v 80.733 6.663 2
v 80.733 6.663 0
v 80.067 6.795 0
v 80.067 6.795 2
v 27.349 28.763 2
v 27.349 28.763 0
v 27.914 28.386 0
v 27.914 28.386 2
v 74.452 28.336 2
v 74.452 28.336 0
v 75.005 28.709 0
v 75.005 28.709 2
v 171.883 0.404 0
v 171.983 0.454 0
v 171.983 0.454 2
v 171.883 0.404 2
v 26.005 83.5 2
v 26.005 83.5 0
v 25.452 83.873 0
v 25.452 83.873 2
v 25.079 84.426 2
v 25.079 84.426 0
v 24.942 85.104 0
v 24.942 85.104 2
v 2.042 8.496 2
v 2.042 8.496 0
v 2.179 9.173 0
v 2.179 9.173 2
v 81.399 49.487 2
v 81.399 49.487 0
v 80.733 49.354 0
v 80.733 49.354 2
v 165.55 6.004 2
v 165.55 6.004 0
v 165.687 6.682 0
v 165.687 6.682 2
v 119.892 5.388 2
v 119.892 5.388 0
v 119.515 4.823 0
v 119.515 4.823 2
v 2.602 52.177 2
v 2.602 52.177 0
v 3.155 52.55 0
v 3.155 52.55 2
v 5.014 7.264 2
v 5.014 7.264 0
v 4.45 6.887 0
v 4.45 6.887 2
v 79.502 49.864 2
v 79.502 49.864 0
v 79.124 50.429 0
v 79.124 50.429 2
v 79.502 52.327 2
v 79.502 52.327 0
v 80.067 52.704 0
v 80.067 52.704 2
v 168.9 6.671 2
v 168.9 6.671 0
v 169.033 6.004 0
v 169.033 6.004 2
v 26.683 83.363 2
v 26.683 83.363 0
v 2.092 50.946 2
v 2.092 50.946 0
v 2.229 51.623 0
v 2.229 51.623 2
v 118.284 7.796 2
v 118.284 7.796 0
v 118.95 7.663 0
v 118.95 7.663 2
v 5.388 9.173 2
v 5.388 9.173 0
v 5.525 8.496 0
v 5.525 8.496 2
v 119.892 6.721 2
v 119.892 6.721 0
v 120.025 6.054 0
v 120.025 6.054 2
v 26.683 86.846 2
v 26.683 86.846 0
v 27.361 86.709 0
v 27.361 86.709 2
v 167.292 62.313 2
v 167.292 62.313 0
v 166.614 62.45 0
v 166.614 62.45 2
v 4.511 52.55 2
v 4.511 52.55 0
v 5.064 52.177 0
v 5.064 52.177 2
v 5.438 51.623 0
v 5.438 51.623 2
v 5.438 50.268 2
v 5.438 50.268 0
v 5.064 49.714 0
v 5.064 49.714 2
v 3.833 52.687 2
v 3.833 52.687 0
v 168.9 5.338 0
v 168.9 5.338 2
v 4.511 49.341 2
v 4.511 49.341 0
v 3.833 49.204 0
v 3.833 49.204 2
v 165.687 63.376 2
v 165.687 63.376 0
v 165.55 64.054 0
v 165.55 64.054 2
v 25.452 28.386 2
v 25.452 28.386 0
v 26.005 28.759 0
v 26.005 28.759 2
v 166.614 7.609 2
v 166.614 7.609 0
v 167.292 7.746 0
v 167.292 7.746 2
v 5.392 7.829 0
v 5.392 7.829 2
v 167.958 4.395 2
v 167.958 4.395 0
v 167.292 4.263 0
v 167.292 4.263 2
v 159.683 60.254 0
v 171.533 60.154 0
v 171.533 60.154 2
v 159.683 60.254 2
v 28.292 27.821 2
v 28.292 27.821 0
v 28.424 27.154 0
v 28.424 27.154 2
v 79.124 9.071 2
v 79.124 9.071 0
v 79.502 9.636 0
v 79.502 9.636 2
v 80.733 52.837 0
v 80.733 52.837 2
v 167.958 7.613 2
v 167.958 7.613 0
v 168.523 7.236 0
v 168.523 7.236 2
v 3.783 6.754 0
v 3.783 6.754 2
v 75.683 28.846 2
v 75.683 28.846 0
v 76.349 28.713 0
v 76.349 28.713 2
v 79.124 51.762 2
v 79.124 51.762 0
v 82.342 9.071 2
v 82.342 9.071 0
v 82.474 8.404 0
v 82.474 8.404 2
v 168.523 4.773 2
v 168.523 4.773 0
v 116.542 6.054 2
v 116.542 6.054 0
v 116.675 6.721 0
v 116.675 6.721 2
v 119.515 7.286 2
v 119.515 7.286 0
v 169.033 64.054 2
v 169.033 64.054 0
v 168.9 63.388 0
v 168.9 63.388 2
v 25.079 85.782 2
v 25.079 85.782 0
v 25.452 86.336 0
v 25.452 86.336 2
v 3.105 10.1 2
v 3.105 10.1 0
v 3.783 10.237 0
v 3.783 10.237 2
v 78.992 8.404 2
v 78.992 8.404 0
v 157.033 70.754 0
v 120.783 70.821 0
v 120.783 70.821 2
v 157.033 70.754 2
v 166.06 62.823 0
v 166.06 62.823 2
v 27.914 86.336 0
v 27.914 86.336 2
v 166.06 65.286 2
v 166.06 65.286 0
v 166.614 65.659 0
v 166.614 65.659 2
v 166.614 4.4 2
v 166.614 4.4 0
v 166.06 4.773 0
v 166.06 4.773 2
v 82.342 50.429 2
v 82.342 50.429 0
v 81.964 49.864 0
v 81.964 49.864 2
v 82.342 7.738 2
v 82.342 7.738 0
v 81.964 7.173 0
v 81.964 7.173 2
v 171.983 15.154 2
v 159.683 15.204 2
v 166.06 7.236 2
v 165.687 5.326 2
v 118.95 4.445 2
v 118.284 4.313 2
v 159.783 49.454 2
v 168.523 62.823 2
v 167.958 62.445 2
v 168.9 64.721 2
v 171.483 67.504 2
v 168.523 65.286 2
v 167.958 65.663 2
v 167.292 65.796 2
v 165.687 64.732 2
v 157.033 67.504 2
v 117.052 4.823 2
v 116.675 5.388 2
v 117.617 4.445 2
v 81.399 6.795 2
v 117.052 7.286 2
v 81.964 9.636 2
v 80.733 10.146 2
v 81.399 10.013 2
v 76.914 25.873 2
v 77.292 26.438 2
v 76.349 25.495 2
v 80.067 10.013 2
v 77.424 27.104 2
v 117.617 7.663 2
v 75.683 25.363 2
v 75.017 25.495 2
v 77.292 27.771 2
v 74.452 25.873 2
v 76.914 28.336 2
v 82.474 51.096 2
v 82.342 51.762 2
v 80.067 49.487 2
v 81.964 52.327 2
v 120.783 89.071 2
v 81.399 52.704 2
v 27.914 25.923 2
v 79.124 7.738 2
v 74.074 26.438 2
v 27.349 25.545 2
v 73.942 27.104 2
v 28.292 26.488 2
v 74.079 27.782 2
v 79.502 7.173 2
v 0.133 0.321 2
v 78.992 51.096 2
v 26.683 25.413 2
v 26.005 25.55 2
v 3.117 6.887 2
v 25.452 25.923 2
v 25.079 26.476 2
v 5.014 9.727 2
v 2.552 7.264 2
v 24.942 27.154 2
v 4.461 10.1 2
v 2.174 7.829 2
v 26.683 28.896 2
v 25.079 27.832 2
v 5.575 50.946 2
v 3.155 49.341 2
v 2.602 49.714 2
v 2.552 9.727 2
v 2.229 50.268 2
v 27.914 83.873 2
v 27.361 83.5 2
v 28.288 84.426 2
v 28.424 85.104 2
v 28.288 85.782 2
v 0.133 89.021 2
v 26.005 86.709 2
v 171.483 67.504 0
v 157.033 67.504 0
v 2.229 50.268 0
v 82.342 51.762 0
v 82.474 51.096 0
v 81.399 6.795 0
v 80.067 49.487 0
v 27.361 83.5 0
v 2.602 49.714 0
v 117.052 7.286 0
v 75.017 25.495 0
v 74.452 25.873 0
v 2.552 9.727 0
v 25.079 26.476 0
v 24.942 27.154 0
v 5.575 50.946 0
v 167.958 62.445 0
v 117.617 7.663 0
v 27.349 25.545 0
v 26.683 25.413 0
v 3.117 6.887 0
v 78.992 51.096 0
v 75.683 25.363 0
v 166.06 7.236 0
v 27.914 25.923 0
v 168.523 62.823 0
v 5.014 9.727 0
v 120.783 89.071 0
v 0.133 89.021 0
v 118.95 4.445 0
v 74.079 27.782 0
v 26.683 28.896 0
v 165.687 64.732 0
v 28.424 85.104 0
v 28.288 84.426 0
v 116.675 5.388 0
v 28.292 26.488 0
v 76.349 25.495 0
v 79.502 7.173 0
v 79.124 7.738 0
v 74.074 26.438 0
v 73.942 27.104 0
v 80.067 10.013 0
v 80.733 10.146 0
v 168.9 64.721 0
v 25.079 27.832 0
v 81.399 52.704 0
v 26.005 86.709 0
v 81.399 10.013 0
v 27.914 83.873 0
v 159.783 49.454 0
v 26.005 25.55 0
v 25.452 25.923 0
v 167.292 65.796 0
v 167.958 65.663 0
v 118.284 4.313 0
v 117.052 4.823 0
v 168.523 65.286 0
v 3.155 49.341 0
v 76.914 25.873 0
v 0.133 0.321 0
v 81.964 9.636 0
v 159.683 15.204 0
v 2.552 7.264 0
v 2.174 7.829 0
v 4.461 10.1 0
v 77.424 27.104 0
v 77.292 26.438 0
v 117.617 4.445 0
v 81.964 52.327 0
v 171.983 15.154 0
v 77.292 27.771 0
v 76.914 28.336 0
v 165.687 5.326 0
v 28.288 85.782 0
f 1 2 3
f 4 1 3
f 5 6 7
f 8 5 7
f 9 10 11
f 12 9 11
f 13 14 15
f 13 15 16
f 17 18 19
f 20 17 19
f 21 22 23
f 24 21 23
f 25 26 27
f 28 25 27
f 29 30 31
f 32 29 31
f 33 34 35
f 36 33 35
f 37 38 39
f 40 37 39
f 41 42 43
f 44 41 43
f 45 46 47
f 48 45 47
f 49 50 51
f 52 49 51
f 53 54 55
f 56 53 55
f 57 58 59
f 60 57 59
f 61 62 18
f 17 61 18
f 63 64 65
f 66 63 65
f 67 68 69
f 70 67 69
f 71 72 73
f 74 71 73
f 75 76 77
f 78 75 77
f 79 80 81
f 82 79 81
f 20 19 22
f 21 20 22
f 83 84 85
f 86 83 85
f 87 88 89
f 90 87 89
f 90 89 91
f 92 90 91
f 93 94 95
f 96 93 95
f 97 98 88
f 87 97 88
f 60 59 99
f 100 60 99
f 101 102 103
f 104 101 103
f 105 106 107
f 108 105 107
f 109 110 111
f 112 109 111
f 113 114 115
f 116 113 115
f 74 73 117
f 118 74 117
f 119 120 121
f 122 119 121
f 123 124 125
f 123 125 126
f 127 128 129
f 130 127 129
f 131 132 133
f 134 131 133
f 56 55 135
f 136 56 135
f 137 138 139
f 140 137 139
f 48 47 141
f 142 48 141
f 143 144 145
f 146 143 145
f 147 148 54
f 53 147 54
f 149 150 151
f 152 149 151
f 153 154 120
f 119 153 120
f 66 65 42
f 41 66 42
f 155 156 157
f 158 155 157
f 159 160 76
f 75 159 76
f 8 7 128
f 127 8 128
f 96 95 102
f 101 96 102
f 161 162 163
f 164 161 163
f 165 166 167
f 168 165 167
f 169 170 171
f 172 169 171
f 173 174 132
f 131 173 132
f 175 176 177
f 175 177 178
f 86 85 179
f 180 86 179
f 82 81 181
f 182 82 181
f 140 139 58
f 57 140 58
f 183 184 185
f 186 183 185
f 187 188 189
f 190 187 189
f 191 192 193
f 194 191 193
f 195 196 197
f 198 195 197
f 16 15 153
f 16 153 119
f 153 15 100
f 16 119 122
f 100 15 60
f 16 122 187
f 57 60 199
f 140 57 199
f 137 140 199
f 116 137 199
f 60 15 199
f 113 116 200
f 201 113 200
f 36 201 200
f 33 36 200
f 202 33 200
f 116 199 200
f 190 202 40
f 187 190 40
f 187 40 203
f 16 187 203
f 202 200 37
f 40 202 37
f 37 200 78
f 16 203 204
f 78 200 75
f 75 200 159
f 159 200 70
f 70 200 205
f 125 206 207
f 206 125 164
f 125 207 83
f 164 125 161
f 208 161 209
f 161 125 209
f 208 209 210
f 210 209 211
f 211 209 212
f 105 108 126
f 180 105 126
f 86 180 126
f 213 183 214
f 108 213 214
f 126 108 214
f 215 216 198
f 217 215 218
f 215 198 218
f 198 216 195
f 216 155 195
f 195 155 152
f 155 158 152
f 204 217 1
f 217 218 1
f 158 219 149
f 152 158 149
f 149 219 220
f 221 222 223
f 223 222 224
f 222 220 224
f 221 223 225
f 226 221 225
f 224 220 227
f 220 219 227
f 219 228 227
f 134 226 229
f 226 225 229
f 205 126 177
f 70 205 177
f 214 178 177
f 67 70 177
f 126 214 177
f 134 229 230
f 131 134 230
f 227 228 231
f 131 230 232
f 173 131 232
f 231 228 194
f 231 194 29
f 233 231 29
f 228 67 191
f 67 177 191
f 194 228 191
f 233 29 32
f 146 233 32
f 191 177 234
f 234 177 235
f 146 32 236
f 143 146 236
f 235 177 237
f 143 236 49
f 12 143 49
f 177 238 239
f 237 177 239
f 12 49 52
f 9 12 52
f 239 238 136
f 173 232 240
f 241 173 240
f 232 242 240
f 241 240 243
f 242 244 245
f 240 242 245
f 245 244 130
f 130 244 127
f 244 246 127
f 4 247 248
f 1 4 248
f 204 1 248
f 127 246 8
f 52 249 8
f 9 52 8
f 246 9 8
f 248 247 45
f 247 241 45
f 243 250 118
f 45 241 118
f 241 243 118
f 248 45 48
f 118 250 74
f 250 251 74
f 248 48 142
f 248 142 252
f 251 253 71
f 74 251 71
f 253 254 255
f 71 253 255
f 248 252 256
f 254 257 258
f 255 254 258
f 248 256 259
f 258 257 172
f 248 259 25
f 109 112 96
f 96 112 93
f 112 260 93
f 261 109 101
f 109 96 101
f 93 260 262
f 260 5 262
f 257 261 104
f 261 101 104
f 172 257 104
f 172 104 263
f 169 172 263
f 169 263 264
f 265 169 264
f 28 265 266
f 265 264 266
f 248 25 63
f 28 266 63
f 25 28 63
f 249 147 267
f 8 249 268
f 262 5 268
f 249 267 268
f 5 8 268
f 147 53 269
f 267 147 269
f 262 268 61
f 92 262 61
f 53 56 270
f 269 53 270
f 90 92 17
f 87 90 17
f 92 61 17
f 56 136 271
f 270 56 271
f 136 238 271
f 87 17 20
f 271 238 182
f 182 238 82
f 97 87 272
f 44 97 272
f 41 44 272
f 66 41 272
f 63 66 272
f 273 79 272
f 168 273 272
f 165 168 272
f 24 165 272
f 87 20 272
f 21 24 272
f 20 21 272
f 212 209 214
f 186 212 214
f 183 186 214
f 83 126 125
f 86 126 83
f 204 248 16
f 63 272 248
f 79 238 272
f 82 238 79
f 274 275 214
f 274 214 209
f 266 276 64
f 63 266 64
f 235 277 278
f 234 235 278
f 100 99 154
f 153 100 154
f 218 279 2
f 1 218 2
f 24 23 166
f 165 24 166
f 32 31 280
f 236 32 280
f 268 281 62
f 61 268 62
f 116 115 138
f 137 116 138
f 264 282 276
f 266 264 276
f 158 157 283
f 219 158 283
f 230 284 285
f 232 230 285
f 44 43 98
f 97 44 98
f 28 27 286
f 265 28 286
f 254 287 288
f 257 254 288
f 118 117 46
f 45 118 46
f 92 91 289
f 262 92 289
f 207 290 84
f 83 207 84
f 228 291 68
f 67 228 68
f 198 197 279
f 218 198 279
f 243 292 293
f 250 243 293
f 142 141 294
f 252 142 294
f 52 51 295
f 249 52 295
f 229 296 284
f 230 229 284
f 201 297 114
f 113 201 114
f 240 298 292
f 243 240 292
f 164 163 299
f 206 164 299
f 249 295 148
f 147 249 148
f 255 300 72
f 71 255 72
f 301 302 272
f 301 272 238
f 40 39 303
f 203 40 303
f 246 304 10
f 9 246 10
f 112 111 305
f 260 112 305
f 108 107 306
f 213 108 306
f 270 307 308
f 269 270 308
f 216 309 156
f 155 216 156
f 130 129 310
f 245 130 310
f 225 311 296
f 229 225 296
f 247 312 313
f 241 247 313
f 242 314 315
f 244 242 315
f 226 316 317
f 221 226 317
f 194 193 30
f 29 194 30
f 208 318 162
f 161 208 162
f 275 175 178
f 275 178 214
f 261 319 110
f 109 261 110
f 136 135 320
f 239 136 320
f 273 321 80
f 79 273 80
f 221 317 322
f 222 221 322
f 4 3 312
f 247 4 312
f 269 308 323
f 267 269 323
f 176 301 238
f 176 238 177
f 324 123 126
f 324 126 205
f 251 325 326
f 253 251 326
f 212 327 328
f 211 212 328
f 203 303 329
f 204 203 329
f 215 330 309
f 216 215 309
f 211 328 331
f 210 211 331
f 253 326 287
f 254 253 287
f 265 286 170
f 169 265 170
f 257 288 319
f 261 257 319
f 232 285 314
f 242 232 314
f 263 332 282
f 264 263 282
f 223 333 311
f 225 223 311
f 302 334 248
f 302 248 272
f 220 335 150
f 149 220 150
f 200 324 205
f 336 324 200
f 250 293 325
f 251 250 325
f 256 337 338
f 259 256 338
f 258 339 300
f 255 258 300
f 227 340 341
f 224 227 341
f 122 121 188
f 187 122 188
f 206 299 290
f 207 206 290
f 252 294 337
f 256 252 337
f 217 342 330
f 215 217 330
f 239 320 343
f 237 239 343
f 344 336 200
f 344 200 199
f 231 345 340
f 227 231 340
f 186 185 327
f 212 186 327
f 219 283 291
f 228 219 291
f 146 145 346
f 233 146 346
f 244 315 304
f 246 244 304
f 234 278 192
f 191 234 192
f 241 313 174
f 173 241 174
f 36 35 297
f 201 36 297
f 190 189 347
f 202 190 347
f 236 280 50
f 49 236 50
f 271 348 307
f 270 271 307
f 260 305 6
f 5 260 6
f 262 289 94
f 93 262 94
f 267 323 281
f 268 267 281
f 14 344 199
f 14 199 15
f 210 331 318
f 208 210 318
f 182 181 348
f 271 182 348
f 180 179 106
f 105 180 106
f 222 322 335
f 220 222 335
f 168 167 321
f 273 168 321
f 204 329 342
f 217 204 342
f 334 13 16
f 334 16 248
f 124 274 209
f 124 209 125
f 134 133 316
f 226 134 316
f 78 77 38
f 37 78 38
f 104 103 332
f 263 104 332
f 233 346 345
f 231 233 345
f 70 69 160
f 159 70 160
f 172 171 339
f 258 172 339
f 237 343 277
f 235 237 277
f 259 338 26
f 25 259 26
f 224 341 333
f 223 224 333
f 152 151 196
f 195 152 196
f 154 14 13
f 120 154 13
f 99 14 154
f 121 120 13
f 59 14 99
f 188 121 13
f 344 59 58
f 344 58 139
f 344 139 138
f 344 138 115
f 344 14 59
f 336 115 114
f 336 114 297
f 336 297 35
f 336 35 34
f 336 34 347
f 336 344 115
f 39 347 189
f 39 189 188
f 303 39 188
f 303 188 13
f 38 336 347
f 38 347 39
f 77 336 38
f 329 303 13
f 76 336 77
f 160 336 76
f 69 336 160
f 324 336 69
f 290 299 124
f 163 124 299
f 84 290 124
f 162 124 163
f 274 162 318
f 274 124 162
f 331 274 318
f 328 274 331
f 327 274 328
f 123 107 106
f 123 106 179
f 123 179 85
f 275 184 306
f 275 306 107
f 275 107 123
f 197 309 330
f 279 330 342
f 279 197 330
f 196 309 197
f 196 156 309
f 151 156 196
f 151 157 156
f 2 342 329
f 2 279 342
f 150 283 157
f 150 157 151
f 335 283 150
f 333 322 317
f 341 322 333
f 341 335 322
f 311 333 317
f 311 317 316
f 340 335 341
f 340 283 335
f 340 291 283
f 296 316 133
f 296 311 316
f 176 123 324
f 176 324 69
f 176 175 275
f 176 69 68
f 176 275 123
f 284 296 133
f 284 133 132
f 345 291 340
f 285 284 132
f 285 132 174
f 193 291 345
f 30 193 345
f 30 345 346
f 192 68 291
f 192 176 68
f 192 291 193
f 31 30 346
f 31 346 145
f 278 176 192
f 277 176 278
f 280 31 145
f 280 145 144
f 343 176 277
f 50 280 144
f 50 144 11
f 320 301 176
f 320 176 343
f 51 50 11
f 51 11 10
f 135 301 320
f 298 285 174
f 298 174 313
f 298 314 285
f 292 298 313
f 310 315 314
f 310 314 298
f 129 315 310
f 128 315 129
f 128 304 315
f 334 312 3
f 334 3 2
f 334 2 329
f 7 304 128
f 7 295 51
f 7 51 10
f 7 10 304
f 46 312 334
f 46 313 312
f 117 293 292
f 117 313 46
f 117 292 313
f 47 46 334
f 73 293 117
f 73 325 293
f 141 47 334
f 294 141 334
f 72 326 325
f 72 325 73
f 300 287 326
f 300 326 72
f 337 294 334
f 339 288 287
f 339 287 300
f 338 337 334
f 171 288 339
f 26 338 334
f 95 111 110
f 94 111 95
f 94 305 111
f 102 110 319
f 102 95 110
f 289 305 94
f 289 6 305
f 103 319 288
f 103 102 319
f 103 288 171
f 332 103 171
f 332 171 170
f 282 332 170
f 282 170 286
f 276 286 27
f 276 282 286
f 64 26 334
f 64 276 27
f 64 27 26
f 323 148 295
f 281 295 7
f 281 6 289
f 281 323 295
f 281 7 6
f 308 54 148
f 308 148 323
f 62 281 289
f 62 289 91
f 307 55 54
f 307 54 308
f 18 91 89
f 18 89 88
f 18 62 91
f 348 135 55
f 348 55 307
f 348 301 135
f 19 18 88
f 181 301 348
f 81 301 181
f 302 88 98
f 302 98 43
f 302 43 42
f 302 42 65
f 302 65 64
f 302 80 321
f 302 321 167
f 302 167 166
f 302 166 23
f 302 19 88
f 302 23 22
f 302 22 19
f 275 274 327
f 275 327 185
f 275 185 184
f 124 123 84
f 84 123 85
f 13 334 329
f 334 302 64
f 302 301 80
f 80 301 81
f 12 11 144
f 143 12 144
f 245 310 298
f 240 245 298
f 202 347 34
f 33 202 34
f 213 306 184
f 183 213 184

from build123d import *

# Parameters (mm, degrees)
PAD_DEPTH = 2


with BuildPart() as part:
    # Sketch → Pad (new body)
    with BuildSketch(Plane.XY):
        Polygon((157.033, 67.5042), (171.483, 67.5042), (171.533, 60.1542), (159.683, 60.2542), (159.783, 49.4542), (159.683, 15.2042), (171.983, 15.1542), (171.983, 0.454206), (171.883, 0.404206), (0.133118, 0.321209), (0.133118, 89.0212), (120.783, 89.0712), (120.783, 70.8212), (157.033, 70.7542), align=None)
        Polygon((77.4245, 27.1042), (77.291943, 26.437791), (76.914453, 25.872837), (76.349499, 25.495347), (75.68309, 25.36279), (75.016681, 25.495347), (74.451727, 25.872837), (74.074237, 26.437791), (73.94168, 27.1042), (74.078529, 27.782035), (74.451727, 28.335563), (75.005255, 28.708761), (75.68309, 28.84561), (76.349499, 28.713053), (76.914453, 28.335563), (77.291943, 27.770609), align=None, mode=Mode.SUBTRACT)
        Polygon((82.4745, 8.40421), (82.341943, 7.737801), (81.964453, 7.172847), (81.399499, 6.795357), (80.73309, 6.6628), (80.066681, 6.795357), (79.501727, 7.172847), (79.124237, 7.737801), (78.99168, 8.40421), (79.124237, 9.070619), (79.501727, 9.635573), (80.066681, 10.013063), (80.73309, 10.14562), (81.399499, 10.013063), (81.964453, 9.635573), (82.341943, 9.070619), align=None, mode=Mode.SUBTRACT)
        Polygon((28.4245, 27.1542), (28.291943, 26.487791), (27.914453, 25.922837), (27.349499, 25.545347), (26.68309, 25.41279), (26.005255, 25.549639), (25.451727, 25.922837), (25.078529, 26.476365), (24.94168, 27.1542), (25.078529, 27.832035), (25.451727, 28.385563), (26.005255, 28.758761), (26.68309, 28.89561), (27.349499, 28.763053), (27.914453, 28.385563), (28.291943, 27.820609), align=None, mode=Mode.SUBTRACT)
        Polygon((120.025, 6.05421), (119.892443, 5.387801), (119.514953, 4.822847), (118.949999, 4.445357), (118.28359, 4.3128), (117.617181, 4.445357), (117.052227, 4.822847), (116.674737, 5.387801), (116.54218, 6.05421), (116.674737, 6.720619), (117.052227, 7.285573), (117.617181, 7.663063), (118.28359, 7.79562), (118.949999, 7.663063), (119.514953, 7.285573), (119.892443, 6.720619), align=None, mode=Mode.SUBTRACT)
        Polygon((169.033, 6.00421), (168.900443, 5.337801), (168.522953, 4.772847), (167.957999, 4.395357), (167.29159, 4.2628), (166.613758, 4.399652), (166.060234, 4.772851), (165.687038, 5.326377), (165.55019, 6.00421), (165.687038, 6.682043), (166.060234, 7.235569), (166.613758, 7.608768), (167.29159, 7.74562), (167.957999, 7.613063), (168.522953, 7.235573), (168.900443, 6.670619), align=None, mode=Mode.SUBTRACT)
        Polygon((82.4745, 51.0956), (82.341943, 50.429191), (81.964453, 49.864237), (81.399499, 49.486747), (80.73309, 49.35419), (80.066681, 49.486747), (79.501727, 49.864237), (79.124237, 50.429191), (78.99168, 51.0956), (79.124237, 51.762009), (79.501727, 52.326963), (80.066681, 52.704453), (80.73309, 52.83701), (81.399499, 52.704453), (81.964453, 52.326963), (82.341943, 51.762009), align=None, mode=Mode.SUBTRACT)
        Polygon((169.033, 64.0542), (168.900443, 63.387791), (168.522953, 62.822837), (167.957999, 62.445347), (167.29159, 62.31279), (166.613758, 62.449642), (166.060234, 62.822841), (165.687038, 63.376367), (165.55019, 64.0542), (165.687038, 64.732033), (166.060234, 65.285559), (166.613758, 65.658758), (167.29159, 65.79561), (167.957999, 65.663053), (168.522953, 65.285563), (168.900443, 64.720609), align=None, mode=Mode.SUBTRACT)
        Polygon((28.4245, 85.1042), (28.28765, 84.42637), (27.914453, 83.872847), (27.36093, 83.49965), (26.6831, 83.3628), (26.00527, 83.49965), (25.451747, 83.872847), (25.07855, 84.42637), (24.9417, 85.1042), (25.07855, 85.78203), (25.451747, 86.335553), (26.00527, 86.70875), (26.6831, 86.8456), (27.36093, 86.70875), (27.914453, 86.335553), (28.28765, 85.78203), align=None, mode=Mode.SUBTRACT)
        Polygon((5.57453, 50.9456), (5.437678, 50.267768), (5.064479, 49.714244), (4.510953, 49.341048), (3.83312, 49.2042), (3.155287, 49.341048), (2.601761, 49.714244), (2.228562, 50.267768), (2.09171, 50.9456), (2.228562, 51.623432), (2.601761, 52.176956), (3.155287, 52.550152), (3.83312, 52.687), (4.510953, 52.550152), (5.064479, 52.176956), (5.437678, 51.623432), align=None, mode=Mode.SUBTRACT)
        Polygon((5.52453, 8.49562), (5.391973, 7.829211), (5.014483, 7.264257), (4.449529, 6.886767), (3.78312, 6.75421), (3.116711, 6.886767), (2.551757, 7.264257), (2.174267, 7.829211), (2.04171, 8.49562), (2.178567, 9.173446), (2.551768, 9.726963), (3.105292, 10.100154), (3.78312, 10.237), (4.460948, 10.100154), (5.014472, 9.726963), (5.387673, 9.173446), align=None, mode=Mode.SUBTRACT)
    extrude(amount=PAD_DEPTH)


solid = part.part
